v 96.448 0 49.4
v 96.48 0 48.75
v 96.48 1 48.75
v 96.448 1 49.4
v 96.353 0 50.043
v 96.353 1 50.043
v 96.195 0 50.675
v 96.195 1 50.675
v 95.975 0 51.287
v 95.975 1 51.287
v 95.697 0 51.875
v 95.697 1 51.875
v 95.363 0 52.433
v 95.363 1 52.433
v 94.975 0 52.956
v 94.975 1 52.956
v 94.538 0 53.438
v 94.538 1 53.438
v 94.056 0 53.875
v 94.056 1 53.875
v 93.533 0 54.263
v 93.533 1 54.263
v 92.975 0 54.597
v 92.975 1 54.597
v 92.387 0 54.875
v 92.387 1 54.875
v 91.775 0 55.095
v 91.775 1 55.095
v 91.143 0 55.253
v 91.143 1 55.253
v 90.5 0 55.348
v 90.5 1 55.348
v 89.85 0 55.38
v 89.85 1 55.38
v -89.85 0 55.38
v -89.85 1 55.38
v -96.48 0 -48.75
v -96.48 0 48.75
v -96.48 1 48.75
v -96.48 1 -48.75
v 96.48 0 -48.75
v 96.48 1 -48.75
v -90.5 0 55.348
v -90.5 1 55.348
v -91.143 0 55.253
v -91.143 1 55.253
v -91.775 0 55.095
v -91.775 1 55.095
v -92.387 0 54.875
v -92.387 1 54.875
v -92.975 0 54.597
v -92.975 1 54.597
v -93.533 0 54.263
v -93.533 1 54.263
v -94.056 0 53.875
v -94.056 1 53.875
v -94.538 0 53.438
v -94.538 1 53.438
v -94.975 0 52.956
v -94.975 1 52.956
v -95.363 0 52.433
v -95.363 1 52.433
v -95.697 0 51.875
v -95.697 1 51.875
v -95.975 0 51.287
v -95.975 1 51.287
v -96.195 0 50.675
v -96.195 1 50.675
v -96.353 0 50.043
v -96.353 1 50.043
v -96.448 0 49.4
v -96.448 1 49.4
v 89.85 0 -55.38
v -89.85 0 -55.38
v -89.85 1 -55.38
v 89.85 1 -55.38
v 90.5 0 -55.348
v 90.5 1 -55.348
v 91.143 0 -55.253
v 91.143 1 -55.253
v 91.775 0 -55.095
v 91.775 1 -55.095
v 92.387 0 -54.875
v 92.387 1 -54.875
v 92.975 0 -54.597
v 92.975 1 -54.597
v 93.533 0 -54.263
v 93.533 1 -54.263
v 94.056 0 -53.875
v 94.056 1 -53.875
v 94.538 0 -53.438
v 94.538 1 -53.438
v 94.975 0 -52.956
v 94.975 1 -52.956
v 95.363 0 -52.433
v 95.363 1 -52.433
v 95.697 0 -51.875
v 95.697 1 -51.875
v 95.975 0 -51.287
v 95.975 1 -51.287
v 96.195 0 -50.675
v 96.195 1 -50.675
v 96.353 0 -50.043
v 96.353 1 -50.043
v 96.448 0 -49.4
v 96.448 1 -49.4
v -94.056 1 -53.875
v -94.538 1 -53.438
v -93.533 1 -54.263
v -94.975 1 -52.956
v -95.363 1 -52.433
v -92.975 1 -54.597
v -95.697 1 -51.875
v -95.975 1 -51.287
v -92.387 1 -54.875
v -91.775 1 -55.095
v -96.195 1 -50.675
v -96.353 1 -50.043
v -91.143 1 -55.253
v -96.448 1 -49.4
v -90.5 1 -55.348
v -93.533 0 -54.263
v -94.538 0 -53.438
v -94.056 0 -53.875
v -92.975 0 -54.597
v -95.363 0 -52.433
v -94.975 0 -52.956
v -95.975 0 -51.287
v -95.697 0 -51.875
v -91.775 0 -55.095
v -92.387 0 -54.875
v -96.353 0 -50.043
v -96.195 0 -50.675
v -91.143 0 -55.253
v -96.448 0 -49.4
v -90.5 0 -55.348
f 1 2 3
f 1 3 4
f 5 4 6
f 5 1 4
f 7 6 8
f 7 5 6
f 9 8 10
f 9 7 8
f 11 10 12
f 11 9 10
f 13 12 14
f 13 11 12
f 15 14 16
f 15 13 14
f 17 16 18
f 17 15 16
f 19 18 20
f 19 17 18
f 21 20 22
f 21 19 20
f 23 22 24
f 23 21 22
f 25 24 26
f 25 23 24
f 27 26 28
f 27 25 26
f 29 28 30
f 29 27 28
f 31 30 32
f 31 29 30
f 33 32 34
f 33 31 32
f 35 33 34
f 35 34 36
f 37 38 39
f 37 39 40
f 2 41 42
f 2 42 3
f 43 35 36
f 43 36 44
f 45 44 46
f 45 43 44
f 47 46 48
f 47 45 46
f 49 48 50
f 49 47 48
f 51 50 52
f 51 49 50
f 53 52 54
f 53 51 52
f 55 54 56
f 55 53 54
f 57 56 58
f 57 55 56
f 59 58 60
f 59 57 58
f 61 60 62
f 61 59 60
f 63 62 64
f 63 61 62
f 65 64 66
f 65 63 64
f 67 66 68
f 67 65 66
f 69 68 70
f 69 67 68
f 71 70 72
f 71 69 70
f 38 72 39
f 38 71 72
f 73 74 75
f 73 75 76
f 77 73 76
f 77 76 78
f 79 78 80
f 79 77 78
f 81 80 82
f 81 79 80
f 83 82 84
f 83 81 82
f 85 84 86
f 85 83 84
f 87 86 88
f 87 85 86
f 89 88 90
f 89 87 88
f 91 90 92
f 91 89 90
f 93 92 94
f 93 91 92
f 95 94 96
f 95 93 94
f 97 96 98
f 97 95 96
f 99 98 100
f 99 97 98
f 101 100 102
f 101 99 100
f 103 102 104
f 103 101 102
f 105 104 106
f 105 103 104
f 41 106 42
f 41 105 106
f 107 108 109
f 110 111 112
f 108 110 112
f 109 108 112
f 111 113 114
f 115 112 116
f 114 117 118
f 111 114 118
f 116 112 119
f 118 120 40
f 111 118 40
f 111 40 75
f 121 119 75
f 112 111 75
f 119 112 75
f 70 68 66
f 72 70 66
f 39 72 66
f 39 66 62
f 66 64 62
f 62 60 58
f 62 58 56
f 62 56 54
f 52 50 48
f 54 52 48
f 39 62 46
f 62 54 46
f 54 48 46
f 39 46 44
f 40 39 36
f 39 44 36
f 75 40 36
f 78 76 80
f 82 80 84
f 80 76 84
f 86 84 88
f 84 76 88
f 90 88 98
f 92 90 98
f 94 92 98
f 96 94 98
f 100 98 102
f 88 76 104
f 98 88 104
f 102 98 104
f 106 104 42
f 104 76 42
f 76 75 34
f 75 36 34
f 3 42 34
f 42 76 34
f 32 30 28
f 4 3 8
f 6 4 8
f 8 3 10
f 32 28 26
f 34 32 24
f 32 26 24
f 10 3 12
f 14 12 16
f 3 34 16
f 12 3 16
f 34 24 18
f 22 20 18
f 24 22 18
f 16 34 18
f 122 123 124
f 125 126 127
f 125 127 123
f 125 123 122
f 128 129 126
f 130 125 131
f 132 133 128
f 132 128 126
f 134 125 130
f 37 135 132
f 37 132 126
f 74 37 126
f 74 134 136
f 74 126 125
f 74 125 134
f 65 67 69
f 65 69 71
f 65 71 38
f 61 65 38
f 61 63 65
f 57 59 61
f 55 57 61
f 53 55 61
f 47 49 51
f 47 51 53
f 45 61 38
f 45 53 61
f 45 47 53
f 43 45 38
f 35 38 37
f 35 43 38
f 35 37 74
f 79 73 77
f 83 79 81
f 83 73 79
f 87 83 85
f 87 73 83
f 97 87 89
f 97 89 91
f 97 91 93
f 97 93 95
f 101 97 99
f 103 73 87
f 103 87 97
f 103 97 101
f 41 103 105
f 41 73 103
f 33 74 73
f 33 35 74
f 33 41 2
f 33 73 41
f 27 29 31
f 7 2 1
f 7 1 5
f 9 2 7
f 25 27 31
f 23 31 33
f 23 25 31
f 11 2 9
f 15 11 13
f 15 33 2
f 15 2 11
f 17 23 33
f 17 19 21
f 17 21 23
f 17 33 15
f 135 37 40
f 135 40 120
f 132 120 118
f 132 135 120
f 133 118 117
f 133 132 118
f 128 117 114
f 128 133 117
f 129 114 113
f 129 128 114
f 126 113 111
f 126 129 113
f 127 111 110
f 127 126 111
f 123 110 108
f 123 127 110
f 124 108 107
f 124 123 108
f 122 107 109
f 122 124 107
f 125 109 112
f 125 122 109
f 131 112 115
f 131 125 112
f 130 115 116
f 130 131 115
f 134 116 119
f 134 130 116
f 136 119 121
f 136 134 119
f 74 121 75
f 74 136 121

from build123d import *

# Parameters (mm, degrees)
F0_W     = 166.2
F0_H     = 100.06
F0_W_2   = 6
F0_H_2   = 8
F0_R     = 1.5
F0_W_3   = 8
F0_H_3   = 6
F0_R_2   = 1.25
F0_H_4   = 4
F0_W_4   = 4
F1_DEPTH = 1


with BuildPart() as f1:
    # F0 (on Front) → F1 (new body)
    with BuildSketch(Plane.XZ):
        with BuildLine():
            Line((89.85, 55.38), (-89.85, 55.38))
            ThreePointArc((-89.85, 55.38), (-94.5381179593, 53.4381179593), (-96.48, 48.75))
            Line((-96.48, 48.75), (-96.48, -48.75))
            ThreePointArc((-96.48, -48.75), (-94.5381179593, -53.4381179593), (-89.85, -55.38))
            Line((-89.85, -55.38), (89.85, -55.38))
            ThreePointArc((89.85, -55.38), (94.5381179593, -53.4381179593), (96.48, -48.75))
            Line((96.48, -48.75), (96.48, 48.75))
            ThreePointArc((96.48, 48.75), (94.5381179593, 53.4381179593), (89.85, 55.38))
        make_face()
        with Locations((-1.4, -1.28)):
            Rectangle(F0_W, F0_H, mode=Mode.SUBTRACT)
        with Locations((-1.4, -1.28)):
            Rectangle(F0_W, F0_H)
        Polygon((-57.5, -27.85), (-57.5, -35.85), (-61.5, -35.85), (-67.5, -35.85), (-71.5, -35.85), (-71.5, -27.85), (-67.5, -27.85), (-61.5, -27.85), align=None, mode=Mode.SUBTRACT)
        Polygon((-40.05, -18.05), (-40.05, -14.05), (-32.05, -14.05), (-32.05, -18.05), (-32.05, -24.05), (-32.05, -28.05), (-40.05, -28.05), (-40.05, -24.05), align=None, mode=Mode.SUBTRACT)
        Polygon((68.7, -27.85), (68.7, -35.85), (64.7, -35.85), (58.7, -35.85), (54.7, -35.85), (54.7, -27.85), (58.7, -27.85), (64.7, -27.85), align=None, mode=Mode.SUBTRACT)
        Polygon((17.95, -18.05), (17.95, -14.05), (25.95, -14.05), (25.95, -18.05), (25.95, -24.05), (25.95, -28.05), (17.95, -28.05), (17.95, -24.05), align=None, mode=Mode.SUBTRACT)
        Polygon((-57.5, 37.8), (-57.5, 29.8), (-61.5, 29.8), (-67.5, 29.8), (-71.5, 29.8), (-71.5, 37.8), (-67.5, 37.8), (-61.5, 37.8), align=None, mode=Mode.SUBTRACT)
        Polygon((-32.05, 20.95), (-40.05, 20.95), (-40.05, 24.95), (-40.05, 30.95), (-40.05, 34.95), (-32.05, 34.95), (-32.05, 30.95), (-32.05, 24.95), align=None, mode=Mode.SUBTRACT)
        Polygon((25.95, 20.95), (17.95, 20.95), (17.95, 24.95), (17.95, 30.95), (17.95, 34.95), (25.95, 34.95), (25.95, 30.95), (25.95, 24.95), align=None, mode=Mode.SUBTRACT)
        Polygon((68.7, 37.8), (68.7, 29.8), (64.7, 29.8), (58.7, 29.8), (54.7, 29.8), (54.7, 37.8), (58.7, 37.8), (64.7, 37.8), align=None, mode=Mode.SUBTRACT)
        with Locations((-64.5, -31.85)):
            Rectangle(F0_W_2, F0_H_2)
        with Locations((-64.5, -31.85)):
            Circle(F0_R, mode=Mode.SUBTRACT)
        with Locations((21.95, 27.95)):
            Rectangle(F0_W_3, F0_H_3)
        with Locations((21.95, 27.95)):
            Circle(F0_R_2, mode=Mode.SUBTRACT)
        with Locations((61.7, -31.85)):
            Rectangle(F0_W_2, F0_H_2)
        with Locations((61.7, -31.85)):
            Circle(F0_R, mode=Mode.SUBTRACT)
        with Locations((-36.05, -21.05)):
            Rectangle(F0_W_3, F0_H_3)
        with Locations((-36.05, -21.05)):
            Circle(F0_R_2, mode=Mode.SUBTRACT)
        with Locations((-36.05, 27.95)):
            Rectangle(F0_W_3, F0_H_3)
        with Locations((-36.05, 27.95)):
            Circle(F0_R_2, mode=Mode.SUBTRACT)
        with Locations((61.7, 33.8)):
            Rectangle(F0_W_2, F0_H_2)
        with Locations((61.7, 33.8)):
            Circle(F0_R, mode=Mode.SUBTRACT)
        with Locations((21.95, -21.05)):
            Rectangle(F0_W_3, F0_H_3)
        with Locations((21.95, -21.05)):
            Circle(F0_R_2, mode=Mode.SUBTRACT)
        with Locations((-64.5, 33.8)):
            Rectangle(F0_W_2, F0_H_2)
        with Locations((-64.5, 33.8)):
            Circle(F0_R, mode=Mode.SUBTRACT)
        with Locations((21.95, 32.95)):
            Rectangle(F0_W_3, F0_H_4)
        with Locations((-36.05, 22.95)):
            Rectangle(F0_W_3, F0_H_4)
        with Locations((21.95, -16.05)):
            Rectangle(F0_W_3, F0_H_4)
        with Locations((21.95, 22.95)):
            Rectangle(F0_W_3, F0_H_4)
        with Locations((56.7, 33.8)):
            Rectangle(F0_W_4, F0_H_2)
        with Locations((66.7, 33.8)):
            Rectangle(F0_W_4, F0_H_2)
        with Locations((-69.5, 33.8)):
            Rectangle(F0_W_4, F0_H_2)
        with Locations((-59.5, 33.8)):
            Rectangle(F0_W_4, F0_H_2)
        with Locations((56.7, -31.85)):
            Rectangle(F0_W_4, F0_H_2)
        with Locations((-59.5, -31.85)):
            Rectangle(F0_W_4, F0_H_2)
        with Locations((-69.5, -31.85)):
            Rectangle(F0_W_4, F0_H_2)
        with Locations((-36.05, -26.05)):
            Rectangle(F0_W_3, F0_H_4)
        with Locations((21.95, -26.05)):
            Rectangle(F0_W_3, F0_H_4)
        with Locations((66.7, -31.85)):
            Rectangle(F0_W_4, F0_H_2)
        with Locations((-36.05, -16.05)):
            Rectangle(F0_W_3, F0_H_4)
        with Locations((-36.05, 32.95)):
            Rectangle(F0_W_3, F0_H_4)
        with Locations((-64.5, 33.8)):
            Circle(F0_R)
        with Locations((61.7, 33.8)):
            Circle(F0_R)
        with Locations((-64.5, -31.85)):
            Circle(F0_R)
        with Locations((61.7, -31.85)):
            Circle(F0_R)
        with Locations((-36.05, -21.05)):
            Circle(F0_R_2)
        with Locations((21.95, -21.05)):
            Circle(F0_R_2)
        with Locations((21.95, 27.95)):
            Circle(F0_R_2)
        with Locations((-36.05, 27.95)):
            Circle(F0_R_2)
    extrude(amount=-F1_DEPTH)


solid = f1.part
